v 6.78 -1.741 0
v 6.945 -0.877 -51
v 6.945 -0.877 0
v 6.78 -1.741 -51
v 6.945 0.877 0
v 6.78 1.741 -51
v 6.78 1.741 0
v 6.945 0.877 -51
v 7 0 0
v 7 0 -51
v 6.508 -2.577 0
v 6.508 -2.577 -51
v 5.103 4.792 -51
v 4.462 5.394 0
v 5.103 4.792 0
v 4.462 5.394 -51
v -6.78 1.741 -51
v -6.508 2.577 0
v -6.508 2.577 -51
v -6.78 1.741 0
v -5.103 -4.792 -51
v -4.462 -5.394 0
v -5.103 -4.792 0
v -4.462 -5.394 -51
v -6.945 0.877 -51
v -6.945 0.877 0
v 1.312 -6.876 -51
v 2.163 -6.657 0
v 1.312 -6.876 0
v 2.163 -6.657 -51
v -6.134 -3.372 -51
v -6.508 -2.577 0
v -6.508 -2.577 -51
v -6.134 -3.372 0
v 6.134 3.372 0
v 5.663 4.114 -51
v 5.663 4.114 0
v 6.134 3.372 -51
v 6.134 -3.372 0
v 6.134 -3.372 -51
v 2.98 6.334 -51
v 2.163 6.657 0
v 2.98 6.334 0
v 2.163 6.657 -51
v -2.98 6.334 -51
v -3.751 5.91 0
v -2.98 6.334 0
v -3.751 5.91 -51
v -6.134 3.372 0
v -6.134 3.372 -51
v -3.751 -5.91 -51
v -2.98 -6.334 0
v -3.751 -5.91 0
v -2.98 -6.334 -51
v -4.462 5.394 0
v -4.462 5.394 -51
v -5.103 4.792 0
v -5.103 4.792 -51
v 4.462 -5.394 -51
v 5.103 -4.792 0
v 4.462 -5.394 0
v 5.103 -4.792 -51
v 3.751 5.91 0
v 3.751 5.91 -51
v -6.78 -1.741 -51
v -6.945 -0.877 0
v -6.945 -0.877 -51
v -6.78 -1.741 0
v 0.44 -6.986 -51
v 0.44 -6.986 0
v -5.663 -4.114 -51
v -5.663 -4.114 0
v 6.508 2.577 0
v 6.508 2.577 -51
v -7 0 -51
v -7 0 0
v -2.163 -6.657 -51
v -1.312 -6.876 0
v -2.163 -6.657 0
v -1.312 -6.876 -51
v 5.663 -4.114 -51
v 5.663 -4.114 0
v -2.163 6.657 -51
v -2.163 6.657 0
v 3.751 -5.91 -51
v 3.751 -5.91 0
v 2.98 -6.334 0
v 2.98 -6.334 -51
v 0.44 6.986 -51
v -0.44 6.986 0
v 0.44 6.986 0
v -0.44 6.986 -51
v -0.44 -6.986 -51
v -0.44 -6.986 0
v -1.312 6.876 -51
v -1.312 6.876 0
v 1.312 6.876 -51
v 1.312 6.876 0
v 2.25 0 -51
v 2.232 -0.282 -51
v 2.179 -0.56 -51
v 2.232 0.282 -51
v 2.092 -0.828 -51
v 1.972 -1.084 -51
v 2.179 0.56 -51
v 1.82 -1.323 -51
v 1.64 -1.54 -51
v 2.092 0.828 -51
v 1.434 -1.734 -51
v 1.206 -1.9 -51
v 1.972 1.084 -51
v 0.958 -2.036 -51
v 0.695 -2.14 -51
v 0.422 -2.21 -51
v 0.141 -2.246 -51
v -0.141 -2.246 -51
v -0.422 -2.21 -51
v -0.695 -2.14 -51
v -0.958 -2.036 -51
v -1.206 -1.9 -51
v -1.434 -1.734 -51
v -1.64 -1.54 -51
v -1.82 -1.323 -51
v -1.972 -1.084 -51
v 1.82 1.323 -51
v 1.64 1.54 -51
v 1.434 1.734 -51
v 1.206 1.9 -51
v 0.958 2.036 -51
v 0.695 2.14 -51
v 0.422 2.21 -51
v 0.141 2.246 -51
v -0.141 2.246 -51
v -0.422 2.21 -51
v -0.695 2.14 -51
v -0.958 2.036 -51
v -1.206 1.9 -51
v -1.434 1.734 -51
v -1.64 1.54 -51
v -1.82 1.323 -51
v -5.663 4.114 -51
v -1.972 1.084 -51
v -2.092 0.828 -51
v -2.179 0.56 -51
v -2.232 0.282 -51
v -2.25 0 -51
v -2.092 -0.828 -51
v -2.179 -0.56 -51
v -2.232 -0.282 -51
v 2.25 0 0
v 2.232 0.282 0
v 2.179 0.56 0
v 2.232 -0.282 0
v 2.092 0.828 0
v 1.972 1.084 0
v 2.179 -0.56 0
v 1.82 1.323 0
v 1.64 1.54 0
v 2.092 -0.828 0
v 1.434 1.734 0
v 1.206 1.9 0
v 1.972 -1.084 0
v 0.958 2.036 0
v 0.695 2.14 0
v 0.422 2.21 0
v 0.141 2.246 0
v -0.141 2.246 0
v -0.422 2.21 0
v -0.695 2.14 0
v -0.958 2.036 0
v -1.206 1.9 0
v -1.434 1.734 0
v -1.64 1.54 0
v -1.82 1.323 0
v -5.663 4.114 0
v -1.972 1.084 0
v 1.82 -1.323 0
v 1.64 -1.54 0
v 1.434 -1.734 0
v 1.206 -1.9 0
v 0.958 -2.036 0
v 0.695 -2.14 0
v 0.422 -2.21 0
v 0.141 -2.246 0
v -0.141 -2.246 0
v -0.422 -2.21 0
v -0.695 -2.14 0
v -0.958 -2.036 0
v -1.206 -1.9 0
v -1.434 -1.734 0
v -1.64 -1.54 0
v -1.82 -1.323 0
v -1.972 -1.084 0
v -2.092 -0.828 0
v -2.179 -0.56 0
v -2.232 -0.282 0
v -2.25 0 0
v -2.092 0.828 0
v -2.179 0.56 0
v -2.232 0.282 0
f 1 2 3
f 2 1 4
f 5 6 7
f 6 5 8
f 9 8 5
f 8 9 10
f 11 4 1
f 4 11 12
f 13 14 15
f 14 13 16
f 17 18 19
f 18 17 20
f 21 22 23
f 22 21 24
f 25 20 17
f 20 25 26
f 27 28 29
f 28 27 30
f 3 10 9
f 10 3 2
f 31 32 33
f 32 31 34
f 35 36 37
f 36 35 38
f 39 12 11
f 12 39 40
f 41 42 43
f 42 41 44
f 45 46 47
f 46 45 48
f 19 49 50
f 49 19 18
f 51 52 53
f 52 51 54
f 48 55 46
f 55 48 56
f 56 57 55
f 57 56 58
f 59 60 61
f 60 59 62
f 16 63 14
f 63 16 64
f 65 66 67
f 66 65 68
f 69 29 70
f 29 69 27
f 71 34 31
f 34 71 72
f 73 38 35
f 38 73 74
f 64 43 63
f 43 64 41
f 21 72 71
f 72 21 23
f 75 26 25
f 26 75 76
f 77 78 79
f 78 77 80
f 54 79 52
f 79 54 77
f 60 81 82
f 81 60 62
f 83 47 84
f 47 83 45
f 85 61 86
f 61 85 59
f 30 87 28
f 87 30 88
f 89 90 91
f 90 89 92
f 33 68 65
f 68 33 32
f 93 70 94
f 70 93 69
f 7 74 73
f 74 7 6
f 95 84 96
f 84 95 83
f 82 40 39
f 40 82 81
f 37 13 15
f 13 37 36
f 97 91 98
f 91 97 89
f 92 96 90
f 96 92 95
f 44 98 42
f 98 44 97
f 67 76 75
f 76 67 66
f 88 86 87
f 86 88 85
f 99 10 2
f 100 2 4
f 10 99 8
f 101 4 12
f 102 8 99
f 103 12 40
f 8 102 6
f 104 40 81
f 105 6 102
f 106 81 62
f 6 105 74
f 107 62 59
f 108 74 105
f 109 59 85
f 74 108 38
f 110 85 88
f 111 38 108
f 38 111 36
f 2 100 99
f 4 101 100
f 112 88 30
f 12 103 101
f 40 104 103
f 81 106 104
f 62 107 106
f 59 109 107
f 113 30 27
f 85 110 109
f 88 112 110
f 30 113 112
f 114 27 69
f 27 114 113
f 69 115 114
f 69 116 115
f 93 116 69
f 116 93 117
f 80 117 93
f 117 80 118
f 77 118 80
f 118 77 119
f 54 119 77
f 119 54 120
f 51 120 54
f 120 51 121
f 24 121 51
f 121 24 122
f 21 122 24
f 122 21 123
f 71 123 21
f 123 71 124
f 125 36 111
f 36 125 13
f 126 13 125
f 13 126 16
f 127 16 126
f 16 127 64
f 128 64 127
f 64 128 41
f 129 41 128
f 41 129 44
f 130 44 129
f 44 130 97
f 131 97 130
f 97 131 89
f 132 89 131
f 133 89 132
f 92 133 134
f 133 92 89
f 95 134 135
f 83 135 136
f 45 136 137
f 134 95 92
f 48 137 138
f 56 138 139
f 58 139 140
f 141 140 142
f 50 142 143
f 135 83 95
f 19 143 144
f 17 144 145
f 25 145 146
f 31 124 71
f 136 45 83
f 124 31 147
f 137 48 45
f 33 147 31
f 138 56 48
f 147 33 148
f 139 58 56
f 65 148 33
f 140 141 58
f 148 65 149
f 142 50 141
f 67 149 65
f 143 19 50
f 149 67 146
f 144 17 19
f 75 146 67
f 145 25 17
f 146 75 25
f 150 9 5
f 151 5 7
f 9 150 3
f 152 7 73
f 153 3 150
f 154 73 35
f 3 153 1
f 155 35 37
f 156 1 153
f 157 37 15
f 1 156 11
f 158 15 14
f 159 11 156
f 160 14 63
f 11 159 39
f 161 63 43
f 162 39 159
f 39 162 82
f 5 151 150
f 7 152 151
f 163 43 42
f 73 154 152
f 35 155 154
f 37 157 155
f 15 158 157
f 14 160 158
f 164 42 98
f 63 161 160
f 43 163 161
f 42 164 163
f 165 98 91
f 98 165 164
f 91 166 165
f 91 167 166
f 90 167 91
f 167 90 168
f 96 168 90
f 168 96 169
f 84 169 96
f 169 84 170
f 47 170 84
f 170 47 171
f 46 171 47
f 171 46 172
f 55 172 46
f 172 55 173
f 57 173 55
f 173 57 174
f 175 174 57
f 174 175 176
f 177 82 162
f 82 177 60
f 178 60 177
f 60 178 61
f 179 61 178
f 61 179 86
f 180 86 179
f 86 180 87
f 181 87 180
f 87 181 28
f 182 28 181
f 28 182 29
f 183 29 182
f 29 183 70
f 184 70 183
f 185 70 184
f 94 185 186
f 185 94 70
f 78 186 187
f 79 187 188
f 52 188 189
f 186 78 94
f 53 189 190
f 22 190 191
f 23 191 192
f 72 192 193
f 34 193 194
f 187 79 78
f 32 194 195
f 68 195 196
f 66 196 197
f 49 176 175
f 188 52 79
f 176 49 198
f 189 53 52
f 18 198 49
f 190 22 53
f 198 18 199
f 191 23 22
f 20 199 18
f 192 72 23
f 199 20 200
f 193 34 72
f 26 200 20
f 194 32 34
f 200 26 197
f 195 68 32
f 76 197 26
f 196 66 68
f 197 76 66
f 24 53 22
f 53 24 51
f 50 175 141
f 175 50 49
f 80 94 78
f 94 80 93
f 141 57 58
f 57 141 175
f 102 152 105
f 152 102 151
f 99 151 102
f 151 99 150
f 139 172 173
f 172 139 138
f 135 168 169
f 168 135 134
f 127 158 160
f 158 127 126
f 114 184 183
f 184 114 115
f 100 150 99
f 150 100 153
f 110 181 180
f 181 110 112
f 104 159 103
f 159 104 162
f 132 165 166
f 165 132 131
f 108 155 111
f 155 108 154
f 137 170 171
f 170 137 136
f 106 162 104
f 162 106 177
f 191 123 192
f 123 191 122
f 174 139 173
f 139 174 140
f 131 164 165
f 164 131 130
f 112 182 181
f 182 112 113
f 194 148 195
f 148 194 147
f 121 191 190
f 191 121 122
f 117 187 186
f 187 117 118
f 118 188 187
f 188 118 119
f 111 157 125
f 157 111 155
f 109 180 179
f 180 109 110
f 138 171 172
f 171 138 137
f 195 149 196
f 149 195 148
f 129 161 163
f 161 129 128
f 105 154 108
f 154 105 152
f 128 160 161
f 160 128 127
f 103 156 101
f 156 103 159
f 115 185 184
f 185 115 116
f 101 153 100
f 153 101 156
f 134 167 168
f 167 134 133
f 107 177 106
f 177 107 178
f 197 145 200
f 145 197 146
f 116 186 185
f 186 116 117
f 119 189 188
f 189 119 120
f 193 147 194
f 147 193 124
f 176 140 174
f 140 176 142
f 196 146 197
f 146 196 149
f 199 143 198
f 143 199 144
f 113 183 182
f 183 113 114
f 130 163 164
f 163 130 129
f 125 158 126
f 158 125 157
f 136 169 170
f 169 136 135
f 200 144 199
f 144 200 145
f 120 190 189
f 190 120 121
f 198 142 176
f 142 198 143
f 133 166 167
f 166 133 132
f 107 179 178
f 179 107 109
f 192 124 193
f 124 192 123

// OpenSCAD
$fn = 50;


difference() {
	union() {
		translate(v = [0, 0, -51.0000000000]) {
			cylinder(h = 51, r = 7.0000000000);
		}
		cylinder(h = 0, r = 13.0000000000);
	}
	union() {
		#translate(v = [0, 0, -51]) {
			cylinder(h = 51, r = 2.2500000000);
		}
	}
}
